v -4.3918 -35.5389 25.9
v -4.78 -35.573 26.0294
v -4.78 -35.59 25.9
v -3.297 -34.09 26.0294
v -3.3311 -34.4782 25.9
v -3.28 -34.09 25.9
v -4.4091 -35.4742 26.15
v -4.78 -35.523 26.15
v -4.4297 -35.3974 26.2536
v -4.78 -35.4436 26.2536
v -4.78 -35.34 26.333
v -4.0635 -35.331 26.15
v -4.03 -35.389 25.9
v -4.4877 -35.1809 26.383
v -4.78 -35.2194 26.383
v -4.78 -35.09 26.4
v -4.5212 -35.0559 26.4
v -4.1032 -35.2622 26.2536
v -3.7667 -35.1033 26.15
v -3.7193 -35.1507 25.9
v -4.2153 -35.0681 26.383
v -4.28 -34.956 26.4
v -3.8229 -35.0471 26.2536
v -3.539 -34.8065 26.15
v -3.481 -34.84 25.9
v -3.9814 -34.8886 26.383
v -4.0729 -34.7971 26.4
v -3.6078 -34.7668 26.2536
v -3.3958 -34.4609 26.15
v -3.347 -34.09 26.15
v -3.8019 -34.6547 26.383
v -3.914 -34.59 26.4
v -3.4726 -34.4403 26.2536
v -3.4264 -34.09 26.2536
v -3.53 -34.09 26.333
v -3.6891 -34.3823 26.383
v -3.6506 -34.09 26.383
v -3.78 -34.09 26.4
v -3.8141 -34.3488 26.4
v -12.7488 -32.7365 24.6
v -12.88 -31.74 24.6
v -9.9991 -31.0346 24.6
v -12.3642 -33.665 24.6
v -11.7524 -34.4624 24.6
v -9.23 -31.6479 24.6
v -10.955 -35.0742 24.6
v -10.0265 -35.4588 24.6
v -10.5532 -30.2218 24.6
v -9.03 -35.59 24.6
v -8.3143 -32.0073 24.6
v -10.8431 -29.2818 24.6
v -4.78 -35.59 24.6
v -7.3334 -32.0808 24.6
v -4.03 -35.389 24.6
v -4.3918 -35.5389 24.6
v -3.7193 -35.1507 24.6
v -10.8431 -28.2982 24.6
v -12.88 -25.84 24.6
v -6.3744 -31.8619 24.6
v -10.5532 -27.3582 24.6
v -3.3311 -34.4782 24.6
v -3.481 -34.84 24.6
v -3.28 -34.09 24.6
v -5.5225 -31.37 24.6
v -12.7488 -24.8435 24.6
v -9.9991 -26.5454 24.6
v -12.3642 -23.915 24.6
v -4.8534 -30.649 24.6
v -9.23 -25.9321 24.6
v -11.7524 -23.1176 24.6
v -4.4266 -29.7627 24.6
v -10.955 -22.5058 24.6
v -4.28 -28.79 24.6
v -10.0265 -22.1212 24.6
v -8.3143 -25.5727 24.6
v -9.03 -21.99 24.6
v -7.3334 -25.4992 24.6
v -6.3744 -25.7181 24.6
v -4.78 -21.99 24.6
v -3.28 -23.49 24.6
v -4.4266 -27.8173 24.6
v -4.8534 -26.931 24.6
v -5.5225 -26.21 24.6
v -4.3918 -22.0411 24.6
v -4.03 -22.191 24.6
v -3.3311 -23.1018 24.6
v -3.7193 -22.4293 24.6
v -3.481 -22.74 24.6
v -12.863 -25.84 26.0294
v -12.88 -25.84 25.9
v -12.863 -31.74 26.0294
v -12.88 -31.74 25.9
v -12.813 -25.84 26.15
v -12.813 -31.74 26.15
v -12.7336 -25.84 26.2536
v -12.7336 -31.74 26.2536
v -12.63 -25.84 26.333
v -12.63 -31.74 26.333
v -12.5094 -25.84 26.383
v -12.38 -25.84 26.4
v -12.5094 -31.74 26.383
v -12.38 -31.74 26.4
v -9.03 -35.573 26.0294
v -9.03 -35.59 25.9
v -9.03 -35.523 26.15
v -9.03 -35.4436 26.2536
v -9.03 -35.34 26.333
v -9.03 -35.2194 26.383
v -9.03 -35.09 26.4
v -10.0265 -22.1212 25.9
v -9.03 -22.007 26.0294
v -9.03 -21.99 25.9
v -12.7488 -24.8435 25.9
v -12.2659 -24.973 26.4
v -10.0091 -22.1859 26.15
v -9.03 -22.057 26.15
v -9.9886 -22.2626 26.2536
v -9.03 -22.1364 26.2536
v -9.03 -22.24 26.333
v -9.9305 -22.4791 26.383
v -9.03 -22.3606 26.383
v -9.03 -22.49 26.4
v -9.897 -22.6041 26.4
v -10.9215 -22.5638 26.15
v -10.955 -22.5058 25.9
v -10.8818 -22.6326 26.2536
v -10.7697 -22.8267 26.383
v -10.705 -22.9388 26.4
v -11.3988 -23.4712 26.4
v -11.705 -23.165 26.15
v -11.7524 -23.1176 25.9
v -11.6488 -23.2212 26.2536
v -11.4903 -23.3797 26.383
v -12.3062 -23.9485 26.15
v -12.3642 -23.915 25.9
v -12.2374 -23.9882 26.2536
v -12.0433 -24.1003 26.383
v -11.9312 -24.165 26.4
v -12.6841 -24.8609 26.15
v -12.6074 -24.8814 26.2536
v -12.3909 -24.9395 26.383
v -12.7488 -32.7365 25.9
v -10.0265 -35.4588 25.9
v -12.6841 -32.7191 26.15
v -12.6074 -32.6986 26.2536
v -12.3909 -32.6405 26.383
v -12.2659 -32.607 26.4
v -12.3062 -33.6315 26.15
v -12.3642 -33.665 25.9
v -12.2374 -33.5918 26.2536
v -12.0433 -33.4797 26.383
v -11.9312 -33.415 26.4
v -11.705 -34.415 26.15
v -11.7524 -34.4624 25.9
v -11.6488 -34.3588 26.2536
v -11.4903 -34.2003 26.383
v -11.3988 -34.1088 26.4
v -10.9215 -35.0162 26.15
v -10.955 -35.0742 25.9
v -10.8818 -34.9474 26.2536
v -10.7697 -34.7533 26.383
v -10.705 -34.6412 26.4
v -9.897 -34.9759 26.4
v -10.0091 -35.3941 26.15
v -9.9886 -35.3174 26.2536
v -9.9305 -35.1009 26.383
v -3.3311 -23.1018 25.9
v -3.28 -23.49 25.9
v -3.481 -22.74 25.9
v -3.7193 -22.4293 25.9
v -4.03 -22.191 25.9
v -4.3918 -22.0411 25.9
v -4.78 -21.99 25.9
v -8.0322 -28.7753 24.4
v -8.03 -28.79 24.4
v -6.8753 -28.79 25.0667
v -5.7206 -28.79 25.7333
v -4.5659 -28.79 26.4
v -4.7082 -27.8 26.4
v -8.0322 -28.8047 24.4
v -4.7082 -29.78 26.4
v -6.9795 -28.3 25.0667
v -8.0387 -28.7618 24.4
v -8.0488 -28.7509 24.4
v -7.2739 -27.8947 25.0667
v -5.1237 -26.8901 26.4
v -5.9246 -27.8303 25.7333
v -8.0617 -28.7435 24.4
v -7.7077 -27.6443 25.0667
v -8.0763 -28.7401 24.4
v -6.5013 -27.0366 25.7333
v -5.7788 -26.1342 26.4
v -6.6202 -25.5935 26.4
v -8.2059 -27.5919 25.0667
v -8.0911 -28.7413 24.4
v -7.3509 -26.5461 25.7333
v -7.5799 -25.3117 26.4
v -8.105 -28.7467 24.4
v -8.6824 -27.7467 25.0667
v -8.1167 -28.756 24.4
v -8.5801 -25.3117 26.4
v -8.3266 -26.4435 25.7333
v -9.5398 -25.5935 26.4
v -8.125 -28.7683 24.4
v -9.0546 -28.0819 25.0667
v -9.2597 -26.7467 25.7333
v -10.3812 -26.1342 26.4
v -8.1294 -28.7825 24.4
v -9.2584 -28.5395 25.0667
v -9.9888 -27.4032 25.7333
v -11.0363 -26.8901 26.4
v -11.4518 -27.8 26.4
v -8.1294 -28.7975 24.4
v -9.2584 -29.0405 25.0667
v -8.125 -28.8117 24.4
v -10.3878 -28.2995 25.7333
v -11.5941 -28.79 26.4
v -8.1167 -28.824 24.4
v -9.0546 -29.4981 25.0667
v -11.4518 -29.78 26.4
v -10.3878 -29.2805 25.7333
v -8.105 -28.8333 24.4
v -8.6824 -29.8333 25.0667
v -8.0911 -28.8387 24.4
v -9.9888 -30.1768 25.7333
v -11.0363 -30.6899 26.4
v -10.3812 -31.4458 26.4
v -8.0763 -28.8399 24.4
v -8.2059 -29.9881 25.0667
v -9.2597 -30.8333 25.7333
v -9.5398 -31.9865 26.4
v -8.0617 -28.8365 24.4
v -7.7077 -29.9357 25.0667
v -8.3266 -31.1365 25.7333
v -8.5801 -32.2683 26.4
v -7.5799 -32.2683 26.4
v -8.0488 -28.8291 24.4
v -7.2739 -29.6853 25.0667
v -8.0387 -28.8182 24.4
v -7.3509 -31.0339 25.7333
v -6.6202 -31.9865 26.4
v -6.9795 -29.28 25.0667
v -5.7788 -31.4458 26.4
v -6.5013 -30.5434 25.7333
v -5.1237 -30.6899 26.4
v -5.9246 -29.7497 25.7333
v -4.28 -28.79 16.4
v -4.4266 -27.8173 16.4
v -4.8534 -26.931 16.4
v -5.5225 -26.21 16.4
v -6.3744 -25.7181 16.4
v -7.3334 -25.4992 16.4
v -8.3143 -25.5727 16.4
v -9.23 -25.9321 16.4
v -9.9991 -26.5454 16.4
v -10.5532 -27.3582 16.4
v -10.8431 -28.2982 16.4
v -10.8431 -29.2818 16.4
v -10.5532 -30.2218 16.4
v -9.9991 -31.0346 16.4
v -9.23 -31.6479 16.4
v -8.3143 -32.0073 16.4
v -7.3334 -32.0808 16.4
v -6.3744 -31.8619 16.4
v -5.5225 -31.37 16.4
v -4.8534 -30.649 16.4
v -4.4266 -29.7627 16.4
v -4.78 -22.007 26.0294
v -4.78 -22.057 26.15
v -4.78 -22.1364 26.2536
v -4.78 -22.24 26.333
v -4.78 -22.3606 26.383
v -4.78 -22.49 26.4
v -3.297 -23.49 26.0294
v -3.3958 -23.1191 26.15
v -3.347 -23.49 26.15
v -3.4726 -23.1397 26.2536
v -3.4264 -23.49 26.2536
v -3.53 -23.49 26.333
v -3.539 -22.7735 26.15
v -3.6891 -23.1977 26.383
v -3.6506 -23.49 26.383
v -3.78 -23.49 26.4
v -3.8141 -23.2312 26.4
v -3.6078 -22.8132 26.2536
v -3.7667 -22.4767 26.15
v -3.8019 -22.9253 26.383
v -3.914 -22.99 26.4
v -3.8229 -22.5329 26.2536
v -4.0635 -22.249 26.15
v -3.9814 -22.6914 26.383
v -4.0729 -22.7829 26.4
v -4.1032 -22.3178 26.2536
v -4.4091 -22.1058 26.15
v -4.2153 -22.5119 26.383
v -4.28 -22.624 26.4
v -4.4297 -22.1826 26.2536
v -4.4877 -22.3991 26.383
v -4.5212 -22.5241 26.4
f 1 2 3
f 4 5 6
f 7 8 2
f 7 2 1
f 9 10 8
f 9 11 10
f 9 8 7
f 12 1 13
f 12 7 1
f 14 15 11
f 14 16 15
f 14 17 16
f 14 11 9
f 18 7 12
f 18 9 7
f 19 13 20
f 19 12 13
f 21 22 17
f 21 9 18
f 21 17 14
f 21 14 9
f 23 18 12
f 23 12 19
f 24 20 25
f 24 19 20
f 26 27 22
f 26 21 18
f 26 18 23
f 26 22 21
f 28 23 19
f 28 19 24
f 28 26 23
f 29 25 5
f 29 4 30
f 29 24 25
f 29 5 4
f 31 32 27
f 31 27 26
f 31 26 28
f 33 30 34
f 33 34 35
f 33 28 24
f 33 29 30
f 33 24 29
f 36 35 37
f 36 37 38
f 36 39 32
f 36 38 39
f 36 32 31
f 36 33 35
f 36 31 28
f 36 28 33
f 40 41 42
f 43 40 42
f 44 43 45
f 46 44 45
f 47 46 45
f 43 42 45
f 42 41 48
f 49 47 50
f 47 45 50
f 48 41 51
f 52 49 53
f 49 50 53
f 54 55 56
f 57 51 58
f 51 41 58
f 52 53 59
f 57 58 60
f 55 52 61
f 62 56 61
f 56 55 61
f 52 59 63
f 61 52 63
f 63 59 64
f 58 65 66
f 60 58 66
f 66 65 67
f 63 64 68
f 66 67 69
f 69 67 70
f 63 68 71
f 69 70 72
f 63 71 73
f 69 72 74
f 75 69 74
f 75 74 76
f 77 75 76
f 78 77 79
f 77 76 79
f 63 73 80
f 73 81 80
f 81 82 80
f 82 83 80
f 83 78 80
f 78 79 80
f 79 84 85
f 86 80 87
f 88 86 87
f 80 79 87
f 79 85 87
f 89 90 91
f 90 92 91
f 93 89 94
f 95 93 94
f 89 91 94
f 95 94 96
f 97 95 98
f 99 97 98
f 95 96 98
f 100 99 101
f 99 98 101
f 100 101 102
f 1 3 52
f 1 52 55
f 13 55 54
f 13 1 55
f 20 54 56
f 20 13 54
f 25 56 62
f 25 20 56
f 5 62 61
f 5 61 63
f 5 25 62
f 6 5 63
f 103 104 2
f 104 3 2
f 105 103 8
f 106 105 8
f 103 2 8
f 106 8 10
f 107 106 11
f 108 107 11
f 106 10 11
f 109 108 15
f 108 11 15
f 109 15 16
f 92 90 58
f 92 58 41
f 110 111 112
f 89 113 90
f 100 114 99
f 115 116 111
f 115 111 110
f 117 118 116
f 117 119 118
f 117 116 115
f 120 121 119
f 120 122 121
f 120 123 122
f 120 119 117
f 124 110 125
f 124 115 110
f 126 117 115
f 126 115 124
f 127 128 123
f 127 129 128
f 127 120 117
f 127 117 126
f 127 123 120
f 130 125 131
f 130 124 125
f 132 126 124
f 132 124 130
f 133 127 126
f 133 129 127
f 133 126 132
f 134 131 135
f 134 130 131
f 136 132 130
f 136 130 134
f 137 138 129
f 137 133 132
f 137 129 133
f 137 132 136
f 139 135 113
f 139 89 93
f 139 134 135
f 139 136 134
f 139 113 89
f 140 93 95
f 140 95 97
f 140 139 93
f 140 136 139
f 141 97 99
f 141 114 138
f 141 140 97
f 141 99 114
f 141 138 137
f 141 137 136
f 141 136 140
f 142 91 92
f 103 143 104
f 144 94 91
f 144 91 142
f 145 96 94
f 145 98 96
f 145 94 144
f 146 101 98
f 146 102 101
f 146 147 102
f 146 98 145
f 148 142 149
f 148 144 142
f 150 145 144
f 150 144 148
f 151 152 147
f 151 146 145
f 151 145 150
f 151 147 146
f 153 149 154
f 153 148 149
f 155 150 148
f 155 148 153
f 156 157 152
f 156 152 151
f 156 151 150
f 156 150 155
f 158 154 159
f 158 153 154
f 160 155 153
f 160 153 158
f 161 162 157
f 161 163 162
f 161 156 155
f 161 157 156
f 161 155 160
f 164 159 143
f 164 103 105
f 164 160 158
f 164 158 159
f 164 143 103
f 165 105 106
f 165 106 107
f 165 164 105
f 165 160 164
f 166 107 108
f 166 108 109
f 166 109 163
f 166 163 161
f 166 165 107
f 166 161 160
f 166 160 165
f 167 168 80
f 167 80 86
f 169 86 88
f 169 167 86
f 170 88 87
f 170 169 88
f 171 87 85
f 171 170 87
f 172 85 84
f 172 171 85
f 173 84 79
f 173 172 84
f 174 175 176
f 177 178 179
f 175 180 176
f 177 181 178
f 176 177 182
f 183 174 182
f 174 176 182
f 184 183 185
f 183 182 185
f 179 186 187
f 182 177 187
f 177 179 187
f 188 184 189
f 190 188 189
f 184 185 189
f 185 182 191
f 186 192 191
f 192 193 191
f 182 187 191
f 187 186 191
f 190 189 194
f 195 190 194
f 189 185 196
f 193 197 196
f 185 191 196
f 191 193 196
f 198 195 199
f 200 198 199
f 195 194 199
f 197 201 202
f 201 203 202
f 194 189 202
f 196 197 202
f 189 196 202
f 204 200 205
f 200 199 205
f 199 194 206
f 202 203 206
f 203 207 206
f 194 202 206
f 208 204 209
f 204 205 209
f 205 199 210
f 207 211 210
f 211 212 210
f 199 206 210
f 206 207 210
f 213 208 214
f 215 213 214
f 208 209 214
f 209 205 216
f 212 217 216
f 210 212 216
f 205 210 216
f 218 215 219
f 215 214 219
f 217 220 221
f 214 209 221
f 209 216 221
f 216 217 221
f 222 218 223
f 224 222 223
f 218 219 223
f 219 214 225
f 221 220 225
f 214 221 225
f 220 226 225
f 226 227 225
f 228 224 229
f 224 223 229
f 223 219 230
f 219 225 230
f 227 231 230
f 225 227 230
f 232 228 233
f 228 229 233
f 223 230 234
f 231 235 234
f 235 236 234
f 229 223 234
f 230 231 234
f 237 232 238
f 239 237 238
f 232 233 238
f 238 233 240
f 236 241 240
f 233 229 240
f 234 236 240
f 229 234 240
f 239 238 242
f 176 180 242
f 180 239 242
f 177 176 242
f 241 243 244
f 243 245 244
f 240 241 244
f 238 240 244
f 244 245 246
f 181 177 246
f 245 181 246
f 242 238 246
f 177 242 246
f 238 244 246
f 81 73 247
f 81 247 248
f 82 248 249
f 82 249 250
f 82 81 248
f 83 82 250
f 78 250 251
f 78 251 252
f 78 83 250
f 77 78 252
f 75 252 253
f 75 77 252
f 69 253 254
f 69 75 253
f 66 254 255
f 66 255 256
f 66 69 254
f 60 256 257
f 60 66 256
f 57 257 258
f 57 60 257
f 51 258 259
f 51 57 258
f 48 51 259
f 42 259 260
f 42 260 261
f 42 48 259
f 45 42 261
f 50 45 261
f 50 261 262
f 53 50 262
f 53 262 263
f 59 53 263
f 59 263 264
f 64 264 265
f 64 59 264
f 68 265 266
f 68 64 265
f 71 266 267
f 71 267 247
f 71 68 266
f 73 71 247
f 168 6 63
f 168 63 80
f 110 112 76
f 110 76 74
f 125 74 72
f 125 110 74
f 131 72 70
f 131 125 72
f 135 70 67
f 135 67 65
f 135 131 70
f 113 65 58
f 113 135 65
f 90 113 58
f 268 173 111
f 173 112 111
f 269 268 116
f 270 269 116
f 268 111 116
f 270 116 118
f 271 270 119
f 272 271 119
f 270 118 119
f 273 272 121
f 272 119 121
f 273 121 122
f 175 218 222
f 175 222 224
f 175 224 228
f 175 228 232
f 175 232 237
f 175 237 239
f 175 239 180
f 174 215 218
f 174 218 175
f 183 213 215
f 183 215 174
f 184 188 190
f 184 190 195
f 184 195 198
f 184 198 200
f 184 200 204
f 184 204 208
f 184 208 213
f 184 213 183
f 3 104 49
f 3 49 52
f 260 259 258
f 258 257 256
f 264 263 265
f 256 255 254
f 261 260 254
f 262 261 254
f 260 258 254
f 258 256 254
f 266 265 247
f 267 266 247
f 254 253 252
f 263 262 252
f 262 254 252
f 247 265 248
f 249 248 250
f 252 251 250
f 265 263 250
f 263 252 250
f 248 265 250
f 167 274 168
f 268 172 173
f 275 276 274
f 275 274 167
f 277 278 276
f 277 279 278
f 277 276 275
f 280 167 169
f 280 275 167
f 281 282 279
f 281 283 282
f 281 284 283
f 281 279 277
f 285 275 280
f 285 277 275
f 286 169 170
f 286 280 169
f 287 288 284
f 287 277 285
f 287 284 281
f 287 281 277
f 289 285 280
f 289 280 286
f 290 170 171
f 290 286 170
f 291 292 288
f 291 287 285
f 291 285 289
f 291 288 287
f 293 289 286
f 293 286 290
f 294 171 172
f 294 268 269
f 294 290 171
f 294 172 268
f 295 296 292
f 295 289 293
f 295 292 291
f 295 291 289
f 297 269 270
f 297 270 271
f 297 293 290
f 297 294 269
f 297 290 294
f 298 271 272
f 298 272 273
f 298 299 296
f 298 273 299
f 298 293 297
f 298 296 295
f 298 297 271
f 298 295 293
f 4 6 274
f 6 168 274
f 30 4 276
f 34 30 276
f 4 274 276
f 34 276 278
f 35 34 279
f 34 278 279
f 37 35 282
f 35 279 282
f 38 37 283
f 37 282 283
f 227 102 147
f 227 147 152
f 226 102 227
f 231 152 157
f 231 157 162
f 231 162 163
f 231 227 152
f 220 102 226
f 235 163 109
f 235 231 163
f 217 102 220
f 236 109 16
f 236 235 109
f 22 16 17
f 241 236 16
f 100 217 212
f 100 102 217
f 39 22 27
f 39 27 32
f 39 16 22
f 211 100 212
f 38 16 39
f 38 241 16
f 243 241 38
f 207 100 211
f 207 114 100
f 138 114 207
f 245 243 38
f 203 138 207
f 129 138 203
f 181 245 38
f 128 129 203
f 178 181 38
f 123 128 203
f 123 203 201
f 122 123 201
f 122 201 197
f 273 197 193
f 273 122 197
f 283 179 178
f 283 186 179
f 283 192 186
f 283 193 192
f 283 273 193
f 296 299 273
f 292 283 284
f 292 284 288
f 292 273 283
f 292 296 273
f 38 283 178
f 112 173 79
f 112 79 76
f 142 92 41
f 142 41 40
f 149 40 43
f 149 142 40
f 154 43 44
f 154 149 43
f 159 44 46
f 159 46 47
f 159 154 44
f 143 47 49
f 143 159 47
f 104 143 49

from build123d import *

# Parameters (mm, degrees)
PAD027_DEPTH    = 1.8
SKETCH062_R     = 3.3
PAD028_DEPTH    = 8.2
FILLET_R        = 0.5
SKETCH101_R     = 0.05
POCKET045_DEPTH = 4
POCKET045_TAPER = -60


with BuildPart() as part:
    # Sketch061 → Pad027 (new body)
    with BuildSketch(Plane.XY):
        with BuildLine():
            Line((-12.88, -25.84), (-12.88, -31.74))
            ThreePointArc((-12.88, -31.74), (-11.752361, -34.462361), (-9.03, -35.59))
            Line((-9.03, -35.59), (-4.78, -35.59))
            ThreePointArc((-4.78, -35.59), (-3.71934, -35.15066), (-3.28, -34.09))
            Line((-3.28, -34.09), (-3.28, -23.49))
            ThreePointArc((-3.28, -23.49), (-3.71934, -22.42934), (-4.78, -21.99))
            Line((-4.78, -21.99), (-9.03, -21.99))
            ThreePointArc((-9.03, -21.99), (-11.752361, -23.117639), (-12.88, -25.84))
        make_face()
    extrude(amount=-PAD027_DEPTH)

    # Sketch062 → Pad028 (join)
    with BuildSketch(Plane.XY.offset(-1.8)):
        with Locations((-7.58, -28.79)):
            Circle(SKETCH062_R)
    extrude(amount=-PAD028_DEPTH)

    # Fillet
    fillet_edges = [part.edges().sort_by_distance(p)[0] for p in [
        (-12.88, -28.79, 0),
        (-11.752361, -34.462361, 0),
        (-6.905, -35.59, 0),
        (-3.71934, -35.15066, 0),
        (-3.28, -28.79, 0),
        (-3.71934, -22.42934, 0),
        (-6.905, -21.99, 0),
        (-11.752361, -23.117639, 0),
    ]]
    fillet(fillet_edges, radius=FILLET_R)

    # Sketch101 → Pocket045 (cut)
    with BuildSketch(Plane.XY.offset(-2)):
        with Locations((-8.08, -28.79)):
            Circle(SKETCH101_R)
    extrude(amount=POCKET045_DEPTH, taper=POCKET045_TAPER, mode=Mode.SUBTRACT)


with BuildPart() as part_1:
    # Body008 placement: moved
    add(part.part.moved(Location((0, 0, 26.4))))


solid = part_1.part
